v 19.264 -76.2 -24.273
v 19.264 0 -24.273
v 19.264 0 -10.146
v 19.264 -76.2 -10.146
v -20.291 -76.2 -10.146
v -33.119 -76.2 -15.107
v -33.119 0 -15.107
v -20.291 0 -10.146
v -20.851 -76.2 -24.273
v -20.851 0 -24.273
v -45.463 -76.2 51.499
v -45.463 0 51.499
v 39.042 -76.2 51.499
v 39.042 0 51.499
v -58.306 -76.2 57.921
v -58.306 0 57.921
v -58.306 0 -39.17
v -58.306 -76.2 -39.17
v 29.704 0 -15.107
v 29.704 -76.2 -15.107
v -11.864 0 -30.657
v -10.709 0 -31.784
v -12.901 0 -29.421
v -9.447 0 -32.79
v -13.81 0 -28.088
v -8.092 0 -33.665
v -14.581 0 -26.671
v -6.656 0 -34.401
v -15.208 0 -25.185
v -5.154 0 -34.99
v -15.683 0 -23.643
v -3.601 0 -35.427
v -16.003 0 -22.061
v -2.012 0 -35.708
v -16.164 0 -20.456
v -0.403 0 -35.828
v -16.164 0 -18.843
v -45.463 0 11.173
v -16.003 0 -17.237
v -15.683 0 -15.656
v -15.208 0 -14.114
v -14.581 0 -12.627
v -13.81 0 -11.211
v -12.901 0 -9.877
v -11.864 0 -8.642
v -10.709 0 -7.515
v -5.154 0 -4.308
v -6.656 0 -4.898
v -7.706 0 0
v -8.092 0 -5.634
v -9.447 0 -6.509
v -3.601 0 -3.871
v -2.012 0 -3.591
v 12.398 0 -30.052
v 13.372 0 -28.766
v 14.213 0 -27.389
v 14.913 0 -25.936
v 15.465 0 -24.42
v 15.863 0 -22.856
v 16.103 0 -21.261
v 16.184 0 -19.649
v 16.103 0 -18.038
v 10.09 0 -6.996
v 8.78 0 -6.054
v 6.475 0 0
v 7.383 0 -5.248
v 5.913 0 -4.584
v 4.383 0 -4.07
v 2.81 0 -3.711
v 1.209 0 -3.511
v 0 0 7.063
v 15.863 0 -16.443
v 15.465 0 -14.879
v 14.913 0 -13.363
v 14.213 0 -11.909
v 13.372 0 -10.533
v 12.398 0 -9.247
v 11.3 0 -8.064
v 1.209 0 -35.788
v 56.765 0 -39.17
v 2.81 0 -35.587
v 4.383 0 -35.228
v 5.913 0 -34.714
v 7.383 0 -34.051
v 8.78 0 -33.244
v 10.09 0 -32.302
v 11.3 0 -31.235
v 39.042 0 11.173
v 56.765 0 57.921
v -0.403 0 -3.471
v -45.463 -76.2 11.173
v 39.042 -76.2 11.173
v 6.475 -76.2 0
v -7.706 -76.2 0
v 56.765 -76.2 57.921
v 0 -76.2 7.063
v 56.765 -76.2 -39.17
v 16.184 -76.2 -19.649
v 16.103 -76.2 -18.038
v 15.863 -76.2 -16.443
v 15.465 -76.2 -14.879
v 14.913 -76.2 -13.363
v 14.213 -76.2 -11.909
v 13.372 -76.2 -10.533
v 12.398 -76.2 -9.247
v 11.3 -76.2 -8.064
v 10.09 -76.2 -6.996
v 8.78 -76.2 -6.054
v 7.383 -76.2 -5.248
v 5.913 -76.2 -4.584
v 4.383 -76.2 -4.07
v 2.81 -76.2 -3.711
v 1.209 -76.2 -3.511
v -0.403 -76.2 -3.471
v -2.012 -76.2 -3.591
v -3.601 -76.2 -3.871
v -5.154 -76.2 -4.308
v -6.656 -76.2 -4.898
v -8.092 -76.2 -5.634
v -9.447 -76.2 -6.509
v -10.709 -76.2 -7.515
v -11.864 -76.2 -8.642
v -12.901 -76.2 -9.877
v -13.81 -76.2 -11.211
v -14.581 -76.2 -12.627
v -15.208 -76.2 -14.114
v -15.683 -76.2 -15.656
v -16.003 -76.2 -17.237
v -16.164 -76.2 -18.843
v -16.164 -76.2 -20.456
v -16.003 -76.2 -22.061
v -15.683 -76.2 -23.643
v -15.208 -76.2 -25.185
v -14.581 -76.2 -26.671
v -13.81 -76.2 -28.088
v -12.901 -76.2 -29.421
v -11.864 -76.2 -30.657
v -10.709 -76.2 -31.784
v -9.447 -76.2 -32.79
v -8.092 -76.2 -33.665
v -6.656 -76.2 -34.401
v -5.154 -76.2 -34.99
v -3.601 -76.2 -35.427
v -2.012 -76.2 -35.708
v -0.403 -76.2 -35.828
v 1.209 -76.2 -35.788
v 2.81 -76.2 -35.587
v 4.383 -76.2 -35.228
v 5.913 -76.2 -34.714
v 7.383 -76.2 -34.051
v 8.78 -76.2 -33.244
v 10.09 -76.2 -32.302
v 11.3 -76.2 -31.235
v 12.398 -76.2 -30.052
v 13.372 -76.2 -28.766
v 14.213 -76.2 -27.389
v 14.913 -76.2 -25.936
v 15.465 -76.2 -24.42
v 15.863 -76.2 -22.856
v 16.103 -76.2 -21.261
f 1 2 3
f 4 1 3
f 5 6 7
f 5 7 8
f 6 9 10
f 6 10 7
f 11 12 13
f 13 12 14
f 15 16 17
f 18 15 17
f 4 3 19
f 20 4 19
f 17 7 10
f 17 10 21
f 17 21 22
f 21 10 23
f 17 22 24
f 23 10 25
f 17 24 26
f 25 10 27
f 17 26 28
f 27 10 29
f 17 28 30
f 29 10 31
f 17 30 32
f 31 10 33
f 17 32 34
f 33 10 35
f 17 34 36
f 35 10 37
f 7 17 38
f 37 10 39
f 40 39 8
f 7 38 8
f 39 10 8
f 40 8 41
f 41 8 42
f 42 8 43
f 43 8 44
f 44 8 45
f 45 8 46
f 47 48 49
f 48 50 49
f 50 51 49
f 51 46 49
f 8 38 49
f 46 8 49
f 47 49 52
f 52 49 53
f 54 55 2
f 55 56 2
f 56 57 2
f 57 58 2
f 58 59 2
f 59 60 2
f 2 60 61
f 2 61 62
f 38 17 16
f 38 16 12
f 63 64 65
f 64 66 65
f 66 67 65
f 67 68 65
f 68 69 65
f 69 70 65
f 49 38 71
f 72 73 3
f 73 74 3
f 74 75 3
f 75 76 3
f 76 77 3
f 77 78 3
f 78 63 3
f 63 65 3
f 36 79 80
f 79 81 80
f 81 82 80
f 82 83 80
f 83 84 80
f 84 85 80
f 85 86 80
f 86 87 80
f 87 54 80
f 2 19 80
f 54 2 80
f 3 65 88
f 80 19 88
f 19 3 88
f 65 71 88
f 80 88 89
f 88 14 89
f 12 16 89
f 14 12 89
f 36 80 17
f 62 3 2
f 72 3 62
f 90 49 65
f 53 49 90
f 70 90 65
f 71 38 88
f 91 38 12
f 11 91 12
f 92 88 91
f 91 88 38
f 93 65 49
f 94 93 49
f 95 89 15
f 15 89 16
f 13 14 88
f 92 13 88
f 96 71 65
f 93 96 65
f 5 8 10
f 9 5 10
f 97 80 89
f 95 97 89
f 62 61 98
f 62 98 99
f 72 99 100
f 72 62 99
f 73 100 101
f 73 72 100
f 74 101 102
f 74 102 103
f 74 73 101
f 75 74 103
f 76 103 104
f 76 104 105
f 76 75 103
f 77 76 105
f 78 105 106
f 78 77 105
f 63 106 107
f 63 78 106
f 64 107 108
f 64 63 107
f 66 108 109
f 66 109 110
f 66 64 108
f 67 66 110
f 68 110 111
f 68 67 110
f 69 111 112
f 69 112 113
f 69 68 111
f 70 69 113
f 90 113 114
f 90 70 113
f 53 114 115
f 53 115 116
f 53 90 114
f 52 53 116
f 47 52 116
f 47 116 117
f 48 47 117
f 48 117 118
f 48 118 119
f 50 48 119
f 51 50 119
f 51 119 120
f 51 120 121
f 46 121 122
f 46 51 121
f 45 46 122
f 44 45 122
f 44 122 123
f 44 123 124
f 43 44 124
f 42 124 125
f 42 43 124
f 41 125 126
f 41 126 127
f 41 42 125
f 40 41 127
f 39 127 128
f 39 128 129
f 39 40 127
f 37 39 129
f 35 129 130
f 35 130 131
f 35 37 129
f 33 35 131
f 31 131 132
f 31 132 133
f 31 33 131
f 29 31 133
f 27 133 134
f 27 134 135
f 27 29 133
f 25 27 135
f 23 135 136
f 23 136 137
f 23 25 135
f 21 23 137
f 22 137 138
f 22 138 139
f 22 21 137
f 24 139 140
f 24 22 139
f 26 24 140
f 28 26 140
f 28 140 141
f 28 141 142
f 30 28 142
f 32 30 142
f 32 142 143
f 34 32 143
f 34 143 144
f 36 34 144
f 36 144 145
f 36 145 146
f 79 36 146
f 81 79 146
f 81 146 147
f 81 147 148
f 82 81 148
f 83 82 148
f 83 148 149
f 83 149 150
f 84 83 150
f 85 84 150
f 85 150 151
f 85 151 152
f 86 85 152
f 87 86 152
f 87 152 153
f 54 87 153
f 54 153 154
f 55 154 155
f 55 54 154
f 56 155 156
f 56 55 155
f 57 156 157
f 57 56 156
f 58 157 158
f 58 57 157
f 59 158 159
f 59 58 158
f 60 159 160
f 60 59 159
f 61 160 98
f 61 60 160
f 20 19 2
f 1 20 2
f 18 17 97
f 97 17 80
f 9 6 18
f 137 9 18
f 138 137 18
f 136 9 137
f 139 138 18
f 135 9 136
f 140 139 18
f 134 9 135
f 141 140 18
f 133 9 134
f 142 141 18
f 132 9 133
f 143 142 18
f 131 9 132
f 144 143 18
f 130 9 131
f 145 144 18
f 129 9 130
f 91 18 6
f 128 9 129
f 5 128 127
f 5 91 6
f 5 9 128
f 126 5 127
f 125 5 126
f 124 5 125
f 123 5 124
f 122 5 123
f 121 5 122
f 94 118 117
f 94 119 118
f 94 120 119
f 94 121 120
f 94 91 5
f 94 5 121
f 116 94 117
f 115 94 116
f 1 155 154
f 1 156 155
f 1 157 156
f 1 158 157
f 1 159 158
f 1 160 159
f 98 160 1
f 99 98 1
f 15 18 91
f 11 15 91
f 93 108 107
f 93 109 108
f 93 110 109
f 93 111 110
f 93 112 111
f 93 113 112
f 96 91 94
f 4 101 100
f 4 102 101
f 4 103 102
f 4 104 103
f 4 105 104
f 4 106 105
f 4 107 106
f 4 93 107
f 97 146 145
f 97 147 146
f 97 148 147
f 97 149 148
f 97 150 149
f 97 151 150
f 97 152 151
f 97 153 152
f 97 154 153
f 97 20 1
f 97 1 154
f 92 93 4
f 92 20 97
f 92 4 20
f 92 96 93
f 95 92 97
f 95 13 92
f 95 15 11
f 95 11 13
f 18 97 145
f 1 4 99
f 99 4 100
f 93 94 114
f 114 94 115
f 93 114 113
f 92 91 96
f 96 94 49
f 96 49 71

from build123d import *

# Parameters (mm, degrees)
F0_R     = 16.183835
F1_DEPTH = 76.2


with BuildPart() as f1:
    # F0 (on Front) → F1 (new body)
    with BuildSketch(Plane.XZ):
        Polygon((56.764722, 57.920564), (0, 57.920564), (-58.305845, 57.920564), (-58.305845, -39.170228), (56.764722, -39.170228), align=None)
        Polygon((-33.118952, -15.107391), (-20.291461, -10.14573), (-20.851416, -24.272695), align=None, mode=Mode.SUBTRACT)
        with Locations((0, -19.649327)):
            Circle(F0_R, mode=Mode.SUBTRACT)
        Polygon((19.264044, -24.272695), (19.264044, -10.14573), (29.703761, -15.107391), align=None, mode=Mode.SUBTRACT)
        Polygon((6.474859, 0), (-7.705619, 0), (0, 7.063483), align=None, mode=Mode.SUBTRACT)
        Polygon((-2.311687, 51.499214), (0, 51.499214), (39.041799, 51.499214), (39.041799, 11.173147), (-45.463149, 11.173147), (-45.463149, 51.499214), align=None, mode=Mode.SUBTRACT)
    extrude(amount=F1_DEPTH)


solid = f1.part
